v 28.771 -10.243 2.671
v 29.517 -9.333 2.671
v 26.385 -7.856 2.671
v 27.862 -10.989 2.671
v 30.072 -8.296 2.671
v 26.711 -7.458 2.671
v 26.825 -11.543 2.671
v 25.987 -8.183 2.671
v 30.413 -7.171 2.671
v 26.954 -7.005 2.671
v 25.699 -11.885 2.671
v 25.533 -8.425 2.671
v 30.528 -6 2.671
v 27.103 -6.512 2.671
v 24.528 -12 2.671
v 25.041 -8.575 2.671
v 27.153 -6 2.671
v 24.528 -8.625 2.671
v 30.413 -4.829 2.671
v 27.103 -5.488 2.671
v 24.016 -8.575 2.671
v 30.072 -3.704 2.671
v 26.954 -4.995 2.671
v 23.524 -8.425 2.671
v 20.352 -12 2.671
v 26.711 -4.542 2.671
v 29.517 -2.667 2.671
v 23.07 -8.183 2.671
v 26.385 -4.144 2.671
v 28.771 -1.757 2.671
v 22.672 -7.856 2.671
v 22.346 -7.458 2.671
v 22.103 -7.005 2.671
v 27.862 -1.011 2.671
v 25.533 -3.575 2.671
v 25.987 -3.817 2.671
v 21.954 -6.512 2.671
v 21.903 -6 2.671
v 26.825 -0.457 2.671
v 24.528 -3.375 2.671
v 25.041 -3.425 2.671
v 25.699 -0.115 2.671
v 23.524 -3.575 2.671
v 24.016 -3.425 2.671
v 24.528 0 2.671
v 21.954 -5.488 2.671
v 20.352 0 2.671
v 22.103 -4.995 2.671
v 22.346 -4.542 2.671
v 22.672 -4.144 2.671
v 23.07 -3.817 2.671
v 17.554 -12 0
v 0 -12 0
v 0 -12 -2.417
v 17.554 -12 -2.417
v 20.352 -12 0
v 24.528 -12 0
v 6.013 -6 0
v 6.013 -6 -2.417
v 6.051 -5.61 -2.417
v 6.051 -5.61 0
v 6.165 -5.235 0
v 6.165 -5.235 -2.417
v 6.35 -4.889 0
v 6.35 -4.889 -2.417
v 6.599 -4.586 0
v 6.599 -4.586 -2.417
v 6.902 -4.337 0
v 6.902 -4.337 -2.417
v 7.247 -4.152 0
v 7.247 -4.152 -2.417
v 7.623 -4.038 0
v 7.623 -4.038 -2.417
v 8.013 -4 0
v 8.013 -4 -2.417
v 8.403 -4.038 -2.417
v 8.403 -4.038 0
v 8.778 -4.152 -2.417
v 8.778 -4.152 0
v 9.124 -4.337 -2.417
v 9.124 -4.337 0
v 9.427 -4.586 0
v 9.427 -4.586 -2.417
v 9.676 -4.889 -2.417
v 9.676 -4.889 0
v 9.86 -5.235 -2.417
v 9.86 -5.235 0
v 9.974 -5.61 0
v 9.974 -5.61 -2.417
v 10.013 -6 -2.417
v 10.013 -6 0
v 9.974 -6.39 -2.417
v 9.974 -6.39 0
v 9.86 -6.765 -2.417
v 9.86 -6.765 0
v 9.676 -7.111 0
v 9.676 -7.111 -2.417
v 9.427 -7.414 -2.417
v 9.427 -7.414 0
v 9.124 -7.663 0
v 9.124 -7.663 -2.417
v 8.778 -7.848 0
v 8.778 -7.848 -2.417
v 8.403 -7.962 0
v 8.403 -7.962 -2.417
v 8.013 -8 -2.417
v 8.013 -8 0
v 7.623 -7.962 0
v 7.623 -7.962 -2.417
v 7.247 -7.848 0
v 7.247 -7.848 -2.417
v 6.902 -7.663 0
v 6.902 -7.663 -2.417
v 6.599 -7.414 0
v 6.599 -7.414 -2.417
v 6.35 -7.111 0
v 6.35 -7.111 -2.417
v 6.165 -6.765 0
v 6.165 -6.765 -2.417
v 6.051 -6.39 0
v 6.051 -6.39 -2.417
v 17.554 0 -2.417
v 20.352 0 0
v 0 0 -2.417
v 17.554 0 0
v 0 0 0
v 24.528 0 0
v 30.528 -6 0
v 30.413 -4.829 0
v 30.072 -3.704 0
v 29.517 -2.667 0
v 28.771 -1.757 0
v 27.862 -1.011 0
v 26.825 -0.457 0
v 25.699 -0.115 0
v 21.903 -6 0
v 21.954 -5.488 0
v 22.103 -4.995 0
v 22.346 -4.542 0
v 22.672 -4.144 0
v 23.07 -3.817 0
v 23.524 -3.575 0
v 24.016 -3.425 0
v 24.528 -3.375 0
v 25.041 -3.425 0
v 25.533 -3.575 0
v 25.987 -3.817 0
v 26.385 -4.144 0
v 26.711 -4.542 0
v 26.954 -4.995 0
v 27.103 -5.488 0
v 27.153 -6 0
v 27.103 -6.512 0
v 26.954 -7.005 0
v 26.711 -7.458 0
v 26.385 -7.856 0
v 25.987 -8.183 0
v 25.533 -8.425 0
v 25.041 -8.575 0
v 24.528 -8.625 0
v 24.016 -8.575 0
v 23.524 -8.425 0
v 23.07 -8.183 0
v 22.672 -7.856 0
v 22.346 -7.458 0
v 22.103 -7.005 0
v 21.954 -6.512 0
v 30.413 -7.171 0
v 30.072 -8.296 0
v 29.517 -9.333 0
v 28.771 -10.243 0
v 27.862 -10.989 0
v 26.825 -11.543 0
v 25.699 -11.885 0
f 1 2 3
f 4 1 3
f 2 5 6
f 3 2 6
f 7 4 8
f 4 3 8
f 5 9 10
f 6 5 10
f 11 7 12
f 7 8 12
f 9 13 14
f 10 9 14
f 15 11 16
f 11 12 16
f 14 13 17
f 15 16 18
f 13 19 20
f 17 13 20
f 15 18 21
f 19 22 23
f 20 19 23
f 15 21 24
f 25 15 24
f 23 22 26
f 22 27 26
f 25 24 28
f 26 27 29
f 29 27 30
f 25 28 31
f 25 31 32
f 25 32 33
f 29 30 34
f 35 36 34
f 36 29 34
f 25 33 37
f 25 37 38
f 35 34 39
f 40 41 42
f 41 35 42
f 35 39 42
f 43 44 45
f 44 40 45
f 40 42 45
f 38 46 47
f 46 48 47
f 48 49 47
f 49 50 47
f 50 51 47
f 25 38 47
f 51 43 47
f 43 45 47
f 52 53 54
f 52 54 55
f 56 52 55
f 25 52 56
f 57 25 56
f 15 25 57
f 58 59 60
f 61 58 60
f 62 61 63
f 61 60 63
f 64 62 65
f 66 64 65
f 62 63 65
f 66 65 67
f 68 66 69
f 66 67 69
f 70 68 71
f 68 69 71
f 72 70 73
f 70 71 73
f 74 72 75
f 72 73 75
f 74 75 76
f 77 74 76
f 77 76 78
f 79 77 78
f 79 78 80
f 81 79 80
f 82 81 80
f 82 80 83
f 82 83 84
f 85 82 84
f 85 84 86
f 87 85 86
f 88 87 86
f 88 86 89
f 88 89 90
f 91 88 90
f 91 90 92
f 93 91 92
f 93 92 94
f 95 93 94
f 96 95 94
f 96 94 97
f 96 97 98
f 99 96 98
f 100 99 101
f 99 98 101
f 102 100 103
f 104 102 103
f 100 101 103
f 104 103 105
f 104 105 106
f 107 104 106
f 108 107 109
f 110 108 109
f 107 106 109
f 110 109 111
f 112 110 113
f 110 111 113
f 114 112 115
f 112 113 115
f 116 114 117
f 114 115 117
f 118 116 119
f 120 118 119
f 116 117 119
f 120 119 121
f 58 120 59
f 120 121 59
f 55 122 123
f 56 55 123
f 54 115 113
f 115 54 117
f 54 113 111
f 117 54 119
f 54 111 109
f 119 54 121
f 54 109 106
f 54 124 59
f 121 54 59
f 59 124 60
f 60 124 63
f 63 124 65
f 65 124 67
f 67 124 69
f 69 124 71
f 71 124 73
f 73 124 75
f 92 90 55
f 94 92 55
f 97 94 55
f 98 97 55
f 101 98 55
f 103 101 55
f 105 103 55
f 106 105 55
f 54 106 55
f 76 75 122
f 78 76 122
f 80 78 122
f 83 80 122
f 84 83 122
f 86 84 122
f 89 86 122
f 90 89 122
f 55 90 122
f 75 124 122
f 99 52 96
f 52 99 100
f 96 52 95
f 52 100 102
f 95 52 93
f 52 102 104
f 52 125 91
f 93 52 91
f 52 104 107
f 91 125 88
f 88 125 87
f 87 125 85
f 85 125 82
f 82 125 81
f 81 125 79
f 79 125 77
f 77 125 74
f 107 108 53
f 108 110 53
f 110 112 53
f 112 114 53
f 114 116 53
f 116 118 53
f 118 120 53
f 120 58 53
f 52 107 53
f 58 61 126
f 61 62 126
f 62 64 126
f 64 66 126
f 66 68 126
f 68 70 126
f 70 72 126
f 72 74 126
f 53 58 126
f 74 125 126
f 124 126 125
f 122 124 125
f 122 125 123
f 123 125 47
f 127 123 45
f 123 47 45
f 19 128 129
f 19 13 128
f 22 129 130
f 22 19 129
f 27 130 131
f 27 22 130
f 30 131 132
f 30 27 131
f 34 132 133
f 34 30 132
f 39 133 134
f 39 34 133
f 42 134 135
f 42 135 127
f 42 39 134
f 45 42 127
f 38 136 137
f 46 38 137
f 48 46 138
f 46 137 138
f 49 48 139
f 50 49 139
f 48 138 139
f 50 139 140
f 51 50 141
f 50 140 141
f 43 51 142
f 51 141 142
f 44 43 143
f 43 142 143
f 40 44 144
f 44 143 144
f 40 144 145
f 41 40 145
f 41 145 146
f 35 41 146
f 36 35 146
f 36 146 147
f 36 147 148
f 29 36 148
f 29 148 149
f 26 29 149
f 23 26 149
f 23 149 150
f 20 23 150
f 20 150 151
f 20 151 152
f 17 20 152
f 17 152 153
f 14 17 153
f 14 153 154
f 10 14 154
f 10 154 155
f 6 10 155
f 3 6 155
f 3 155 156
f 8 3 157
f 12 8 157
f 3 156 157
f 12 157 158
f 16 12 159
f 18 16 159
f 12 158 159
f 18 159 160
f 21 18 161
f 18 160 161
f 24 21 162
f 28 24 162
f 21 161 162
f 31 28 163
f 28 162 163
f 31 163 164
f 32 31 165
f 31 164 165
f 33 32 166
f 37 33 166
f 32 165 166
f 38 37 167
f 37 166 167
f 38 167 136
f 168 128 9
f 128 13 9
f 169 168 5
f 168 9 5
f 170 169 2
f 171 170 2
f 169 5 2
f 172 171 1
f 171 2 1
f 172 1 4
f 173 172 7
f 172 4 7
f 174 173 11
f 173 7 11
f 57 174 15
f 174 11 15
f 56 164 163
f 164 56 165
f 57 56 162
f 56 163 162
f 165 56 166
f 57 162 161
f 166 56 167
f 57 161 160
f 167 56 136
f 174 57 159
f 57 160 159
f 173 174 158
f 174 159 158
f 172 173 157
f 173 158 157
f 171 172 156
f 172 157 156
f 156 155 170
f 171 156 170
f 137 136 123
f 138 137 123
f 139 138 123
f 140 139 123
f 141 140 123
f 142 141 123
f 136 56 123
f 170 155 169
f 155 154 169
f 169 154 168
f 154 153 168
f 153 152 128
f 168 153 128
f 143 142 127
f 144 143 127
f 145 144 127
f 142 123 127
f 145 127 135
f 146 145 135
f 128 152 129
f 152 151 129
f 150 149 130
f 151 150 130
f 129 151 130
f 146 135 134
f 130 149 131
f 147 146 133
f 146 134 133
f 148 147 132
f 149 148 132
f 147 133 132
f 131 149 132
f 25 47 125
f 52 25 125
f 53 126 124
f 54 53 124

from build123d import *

# Parameters (mm, degrees)
F1_DEPTH = 12
F2_R     = 6
F3_R     = 5.99999
F5_D     = 5.25
F5_DEPTH = 12
F5_TIP   = 1.5772591249
F7_D     = 4
F7_DEPTH = 12
F7_TIP   = 1.2017212381


# Not quite as in the source:
# - a fillet or chamfer is up to 0.001 mm smaller than in the source, because OpenCascade refuses the exact size


with BuildPart() as f1:
    # F0 (on Front) → F1 (new body)
    with BuildSketch(Plane.XZ):
        Polygon((17.5538621843, 0), (0, 0), (0, -2.4168363307), (17.5538621843, -2.4168363307), (20.3523058444, 0), (30.528459698, 0), (30.528459698, 2.6712401304), (20.3523058444, 2.6712401304), align=None)
    extrude(amount=F1_DEPTH)

    # F2
    f2_edges = [f1.edges().sort_by_distance(p)[0] for p in [
        (30.52846, 0, 1.33562),
    ]]
    fillet(f2_edges, radius=F2_R)

    # F3 (radius 6 in the source; OpenCascade refuses exactly that, so slightly less here)
    f3_edges = [f1.edges().sort_by_distance(p)[0] for p in [
        (30.52846, -12, 1.33562),
    ]]
    fillet(f3_edges, radius=F3_R)

    # F5
    with Locations(Plane.XY.offset(2.6712401304)):
        with Locations((24.528459698, -6)):
            Hole(F5_D / 2, depth=F5_DEPTH)
            with Locations((0, 0, -(F5_DEPTH + F5_TIP / 2))):  # 118° drill point
                Cone(0, F5_D / 2, F5_TIP, mode=Mode.SUBTRACT)

    # F7
    with Locations(Plane.XY):
        with Locations((8.0127185211, -6)):
            Hole(F7_D / 2, depth=F7_DEPTH)
            with Locations((0, 0, -(F7_DEPTH + F7_TIP / 2))):  # 118° drill point
                Cone(0, F7_D / 2, F7_TIP, mode=Mode.SUBTRACT)


solid = f1.part
